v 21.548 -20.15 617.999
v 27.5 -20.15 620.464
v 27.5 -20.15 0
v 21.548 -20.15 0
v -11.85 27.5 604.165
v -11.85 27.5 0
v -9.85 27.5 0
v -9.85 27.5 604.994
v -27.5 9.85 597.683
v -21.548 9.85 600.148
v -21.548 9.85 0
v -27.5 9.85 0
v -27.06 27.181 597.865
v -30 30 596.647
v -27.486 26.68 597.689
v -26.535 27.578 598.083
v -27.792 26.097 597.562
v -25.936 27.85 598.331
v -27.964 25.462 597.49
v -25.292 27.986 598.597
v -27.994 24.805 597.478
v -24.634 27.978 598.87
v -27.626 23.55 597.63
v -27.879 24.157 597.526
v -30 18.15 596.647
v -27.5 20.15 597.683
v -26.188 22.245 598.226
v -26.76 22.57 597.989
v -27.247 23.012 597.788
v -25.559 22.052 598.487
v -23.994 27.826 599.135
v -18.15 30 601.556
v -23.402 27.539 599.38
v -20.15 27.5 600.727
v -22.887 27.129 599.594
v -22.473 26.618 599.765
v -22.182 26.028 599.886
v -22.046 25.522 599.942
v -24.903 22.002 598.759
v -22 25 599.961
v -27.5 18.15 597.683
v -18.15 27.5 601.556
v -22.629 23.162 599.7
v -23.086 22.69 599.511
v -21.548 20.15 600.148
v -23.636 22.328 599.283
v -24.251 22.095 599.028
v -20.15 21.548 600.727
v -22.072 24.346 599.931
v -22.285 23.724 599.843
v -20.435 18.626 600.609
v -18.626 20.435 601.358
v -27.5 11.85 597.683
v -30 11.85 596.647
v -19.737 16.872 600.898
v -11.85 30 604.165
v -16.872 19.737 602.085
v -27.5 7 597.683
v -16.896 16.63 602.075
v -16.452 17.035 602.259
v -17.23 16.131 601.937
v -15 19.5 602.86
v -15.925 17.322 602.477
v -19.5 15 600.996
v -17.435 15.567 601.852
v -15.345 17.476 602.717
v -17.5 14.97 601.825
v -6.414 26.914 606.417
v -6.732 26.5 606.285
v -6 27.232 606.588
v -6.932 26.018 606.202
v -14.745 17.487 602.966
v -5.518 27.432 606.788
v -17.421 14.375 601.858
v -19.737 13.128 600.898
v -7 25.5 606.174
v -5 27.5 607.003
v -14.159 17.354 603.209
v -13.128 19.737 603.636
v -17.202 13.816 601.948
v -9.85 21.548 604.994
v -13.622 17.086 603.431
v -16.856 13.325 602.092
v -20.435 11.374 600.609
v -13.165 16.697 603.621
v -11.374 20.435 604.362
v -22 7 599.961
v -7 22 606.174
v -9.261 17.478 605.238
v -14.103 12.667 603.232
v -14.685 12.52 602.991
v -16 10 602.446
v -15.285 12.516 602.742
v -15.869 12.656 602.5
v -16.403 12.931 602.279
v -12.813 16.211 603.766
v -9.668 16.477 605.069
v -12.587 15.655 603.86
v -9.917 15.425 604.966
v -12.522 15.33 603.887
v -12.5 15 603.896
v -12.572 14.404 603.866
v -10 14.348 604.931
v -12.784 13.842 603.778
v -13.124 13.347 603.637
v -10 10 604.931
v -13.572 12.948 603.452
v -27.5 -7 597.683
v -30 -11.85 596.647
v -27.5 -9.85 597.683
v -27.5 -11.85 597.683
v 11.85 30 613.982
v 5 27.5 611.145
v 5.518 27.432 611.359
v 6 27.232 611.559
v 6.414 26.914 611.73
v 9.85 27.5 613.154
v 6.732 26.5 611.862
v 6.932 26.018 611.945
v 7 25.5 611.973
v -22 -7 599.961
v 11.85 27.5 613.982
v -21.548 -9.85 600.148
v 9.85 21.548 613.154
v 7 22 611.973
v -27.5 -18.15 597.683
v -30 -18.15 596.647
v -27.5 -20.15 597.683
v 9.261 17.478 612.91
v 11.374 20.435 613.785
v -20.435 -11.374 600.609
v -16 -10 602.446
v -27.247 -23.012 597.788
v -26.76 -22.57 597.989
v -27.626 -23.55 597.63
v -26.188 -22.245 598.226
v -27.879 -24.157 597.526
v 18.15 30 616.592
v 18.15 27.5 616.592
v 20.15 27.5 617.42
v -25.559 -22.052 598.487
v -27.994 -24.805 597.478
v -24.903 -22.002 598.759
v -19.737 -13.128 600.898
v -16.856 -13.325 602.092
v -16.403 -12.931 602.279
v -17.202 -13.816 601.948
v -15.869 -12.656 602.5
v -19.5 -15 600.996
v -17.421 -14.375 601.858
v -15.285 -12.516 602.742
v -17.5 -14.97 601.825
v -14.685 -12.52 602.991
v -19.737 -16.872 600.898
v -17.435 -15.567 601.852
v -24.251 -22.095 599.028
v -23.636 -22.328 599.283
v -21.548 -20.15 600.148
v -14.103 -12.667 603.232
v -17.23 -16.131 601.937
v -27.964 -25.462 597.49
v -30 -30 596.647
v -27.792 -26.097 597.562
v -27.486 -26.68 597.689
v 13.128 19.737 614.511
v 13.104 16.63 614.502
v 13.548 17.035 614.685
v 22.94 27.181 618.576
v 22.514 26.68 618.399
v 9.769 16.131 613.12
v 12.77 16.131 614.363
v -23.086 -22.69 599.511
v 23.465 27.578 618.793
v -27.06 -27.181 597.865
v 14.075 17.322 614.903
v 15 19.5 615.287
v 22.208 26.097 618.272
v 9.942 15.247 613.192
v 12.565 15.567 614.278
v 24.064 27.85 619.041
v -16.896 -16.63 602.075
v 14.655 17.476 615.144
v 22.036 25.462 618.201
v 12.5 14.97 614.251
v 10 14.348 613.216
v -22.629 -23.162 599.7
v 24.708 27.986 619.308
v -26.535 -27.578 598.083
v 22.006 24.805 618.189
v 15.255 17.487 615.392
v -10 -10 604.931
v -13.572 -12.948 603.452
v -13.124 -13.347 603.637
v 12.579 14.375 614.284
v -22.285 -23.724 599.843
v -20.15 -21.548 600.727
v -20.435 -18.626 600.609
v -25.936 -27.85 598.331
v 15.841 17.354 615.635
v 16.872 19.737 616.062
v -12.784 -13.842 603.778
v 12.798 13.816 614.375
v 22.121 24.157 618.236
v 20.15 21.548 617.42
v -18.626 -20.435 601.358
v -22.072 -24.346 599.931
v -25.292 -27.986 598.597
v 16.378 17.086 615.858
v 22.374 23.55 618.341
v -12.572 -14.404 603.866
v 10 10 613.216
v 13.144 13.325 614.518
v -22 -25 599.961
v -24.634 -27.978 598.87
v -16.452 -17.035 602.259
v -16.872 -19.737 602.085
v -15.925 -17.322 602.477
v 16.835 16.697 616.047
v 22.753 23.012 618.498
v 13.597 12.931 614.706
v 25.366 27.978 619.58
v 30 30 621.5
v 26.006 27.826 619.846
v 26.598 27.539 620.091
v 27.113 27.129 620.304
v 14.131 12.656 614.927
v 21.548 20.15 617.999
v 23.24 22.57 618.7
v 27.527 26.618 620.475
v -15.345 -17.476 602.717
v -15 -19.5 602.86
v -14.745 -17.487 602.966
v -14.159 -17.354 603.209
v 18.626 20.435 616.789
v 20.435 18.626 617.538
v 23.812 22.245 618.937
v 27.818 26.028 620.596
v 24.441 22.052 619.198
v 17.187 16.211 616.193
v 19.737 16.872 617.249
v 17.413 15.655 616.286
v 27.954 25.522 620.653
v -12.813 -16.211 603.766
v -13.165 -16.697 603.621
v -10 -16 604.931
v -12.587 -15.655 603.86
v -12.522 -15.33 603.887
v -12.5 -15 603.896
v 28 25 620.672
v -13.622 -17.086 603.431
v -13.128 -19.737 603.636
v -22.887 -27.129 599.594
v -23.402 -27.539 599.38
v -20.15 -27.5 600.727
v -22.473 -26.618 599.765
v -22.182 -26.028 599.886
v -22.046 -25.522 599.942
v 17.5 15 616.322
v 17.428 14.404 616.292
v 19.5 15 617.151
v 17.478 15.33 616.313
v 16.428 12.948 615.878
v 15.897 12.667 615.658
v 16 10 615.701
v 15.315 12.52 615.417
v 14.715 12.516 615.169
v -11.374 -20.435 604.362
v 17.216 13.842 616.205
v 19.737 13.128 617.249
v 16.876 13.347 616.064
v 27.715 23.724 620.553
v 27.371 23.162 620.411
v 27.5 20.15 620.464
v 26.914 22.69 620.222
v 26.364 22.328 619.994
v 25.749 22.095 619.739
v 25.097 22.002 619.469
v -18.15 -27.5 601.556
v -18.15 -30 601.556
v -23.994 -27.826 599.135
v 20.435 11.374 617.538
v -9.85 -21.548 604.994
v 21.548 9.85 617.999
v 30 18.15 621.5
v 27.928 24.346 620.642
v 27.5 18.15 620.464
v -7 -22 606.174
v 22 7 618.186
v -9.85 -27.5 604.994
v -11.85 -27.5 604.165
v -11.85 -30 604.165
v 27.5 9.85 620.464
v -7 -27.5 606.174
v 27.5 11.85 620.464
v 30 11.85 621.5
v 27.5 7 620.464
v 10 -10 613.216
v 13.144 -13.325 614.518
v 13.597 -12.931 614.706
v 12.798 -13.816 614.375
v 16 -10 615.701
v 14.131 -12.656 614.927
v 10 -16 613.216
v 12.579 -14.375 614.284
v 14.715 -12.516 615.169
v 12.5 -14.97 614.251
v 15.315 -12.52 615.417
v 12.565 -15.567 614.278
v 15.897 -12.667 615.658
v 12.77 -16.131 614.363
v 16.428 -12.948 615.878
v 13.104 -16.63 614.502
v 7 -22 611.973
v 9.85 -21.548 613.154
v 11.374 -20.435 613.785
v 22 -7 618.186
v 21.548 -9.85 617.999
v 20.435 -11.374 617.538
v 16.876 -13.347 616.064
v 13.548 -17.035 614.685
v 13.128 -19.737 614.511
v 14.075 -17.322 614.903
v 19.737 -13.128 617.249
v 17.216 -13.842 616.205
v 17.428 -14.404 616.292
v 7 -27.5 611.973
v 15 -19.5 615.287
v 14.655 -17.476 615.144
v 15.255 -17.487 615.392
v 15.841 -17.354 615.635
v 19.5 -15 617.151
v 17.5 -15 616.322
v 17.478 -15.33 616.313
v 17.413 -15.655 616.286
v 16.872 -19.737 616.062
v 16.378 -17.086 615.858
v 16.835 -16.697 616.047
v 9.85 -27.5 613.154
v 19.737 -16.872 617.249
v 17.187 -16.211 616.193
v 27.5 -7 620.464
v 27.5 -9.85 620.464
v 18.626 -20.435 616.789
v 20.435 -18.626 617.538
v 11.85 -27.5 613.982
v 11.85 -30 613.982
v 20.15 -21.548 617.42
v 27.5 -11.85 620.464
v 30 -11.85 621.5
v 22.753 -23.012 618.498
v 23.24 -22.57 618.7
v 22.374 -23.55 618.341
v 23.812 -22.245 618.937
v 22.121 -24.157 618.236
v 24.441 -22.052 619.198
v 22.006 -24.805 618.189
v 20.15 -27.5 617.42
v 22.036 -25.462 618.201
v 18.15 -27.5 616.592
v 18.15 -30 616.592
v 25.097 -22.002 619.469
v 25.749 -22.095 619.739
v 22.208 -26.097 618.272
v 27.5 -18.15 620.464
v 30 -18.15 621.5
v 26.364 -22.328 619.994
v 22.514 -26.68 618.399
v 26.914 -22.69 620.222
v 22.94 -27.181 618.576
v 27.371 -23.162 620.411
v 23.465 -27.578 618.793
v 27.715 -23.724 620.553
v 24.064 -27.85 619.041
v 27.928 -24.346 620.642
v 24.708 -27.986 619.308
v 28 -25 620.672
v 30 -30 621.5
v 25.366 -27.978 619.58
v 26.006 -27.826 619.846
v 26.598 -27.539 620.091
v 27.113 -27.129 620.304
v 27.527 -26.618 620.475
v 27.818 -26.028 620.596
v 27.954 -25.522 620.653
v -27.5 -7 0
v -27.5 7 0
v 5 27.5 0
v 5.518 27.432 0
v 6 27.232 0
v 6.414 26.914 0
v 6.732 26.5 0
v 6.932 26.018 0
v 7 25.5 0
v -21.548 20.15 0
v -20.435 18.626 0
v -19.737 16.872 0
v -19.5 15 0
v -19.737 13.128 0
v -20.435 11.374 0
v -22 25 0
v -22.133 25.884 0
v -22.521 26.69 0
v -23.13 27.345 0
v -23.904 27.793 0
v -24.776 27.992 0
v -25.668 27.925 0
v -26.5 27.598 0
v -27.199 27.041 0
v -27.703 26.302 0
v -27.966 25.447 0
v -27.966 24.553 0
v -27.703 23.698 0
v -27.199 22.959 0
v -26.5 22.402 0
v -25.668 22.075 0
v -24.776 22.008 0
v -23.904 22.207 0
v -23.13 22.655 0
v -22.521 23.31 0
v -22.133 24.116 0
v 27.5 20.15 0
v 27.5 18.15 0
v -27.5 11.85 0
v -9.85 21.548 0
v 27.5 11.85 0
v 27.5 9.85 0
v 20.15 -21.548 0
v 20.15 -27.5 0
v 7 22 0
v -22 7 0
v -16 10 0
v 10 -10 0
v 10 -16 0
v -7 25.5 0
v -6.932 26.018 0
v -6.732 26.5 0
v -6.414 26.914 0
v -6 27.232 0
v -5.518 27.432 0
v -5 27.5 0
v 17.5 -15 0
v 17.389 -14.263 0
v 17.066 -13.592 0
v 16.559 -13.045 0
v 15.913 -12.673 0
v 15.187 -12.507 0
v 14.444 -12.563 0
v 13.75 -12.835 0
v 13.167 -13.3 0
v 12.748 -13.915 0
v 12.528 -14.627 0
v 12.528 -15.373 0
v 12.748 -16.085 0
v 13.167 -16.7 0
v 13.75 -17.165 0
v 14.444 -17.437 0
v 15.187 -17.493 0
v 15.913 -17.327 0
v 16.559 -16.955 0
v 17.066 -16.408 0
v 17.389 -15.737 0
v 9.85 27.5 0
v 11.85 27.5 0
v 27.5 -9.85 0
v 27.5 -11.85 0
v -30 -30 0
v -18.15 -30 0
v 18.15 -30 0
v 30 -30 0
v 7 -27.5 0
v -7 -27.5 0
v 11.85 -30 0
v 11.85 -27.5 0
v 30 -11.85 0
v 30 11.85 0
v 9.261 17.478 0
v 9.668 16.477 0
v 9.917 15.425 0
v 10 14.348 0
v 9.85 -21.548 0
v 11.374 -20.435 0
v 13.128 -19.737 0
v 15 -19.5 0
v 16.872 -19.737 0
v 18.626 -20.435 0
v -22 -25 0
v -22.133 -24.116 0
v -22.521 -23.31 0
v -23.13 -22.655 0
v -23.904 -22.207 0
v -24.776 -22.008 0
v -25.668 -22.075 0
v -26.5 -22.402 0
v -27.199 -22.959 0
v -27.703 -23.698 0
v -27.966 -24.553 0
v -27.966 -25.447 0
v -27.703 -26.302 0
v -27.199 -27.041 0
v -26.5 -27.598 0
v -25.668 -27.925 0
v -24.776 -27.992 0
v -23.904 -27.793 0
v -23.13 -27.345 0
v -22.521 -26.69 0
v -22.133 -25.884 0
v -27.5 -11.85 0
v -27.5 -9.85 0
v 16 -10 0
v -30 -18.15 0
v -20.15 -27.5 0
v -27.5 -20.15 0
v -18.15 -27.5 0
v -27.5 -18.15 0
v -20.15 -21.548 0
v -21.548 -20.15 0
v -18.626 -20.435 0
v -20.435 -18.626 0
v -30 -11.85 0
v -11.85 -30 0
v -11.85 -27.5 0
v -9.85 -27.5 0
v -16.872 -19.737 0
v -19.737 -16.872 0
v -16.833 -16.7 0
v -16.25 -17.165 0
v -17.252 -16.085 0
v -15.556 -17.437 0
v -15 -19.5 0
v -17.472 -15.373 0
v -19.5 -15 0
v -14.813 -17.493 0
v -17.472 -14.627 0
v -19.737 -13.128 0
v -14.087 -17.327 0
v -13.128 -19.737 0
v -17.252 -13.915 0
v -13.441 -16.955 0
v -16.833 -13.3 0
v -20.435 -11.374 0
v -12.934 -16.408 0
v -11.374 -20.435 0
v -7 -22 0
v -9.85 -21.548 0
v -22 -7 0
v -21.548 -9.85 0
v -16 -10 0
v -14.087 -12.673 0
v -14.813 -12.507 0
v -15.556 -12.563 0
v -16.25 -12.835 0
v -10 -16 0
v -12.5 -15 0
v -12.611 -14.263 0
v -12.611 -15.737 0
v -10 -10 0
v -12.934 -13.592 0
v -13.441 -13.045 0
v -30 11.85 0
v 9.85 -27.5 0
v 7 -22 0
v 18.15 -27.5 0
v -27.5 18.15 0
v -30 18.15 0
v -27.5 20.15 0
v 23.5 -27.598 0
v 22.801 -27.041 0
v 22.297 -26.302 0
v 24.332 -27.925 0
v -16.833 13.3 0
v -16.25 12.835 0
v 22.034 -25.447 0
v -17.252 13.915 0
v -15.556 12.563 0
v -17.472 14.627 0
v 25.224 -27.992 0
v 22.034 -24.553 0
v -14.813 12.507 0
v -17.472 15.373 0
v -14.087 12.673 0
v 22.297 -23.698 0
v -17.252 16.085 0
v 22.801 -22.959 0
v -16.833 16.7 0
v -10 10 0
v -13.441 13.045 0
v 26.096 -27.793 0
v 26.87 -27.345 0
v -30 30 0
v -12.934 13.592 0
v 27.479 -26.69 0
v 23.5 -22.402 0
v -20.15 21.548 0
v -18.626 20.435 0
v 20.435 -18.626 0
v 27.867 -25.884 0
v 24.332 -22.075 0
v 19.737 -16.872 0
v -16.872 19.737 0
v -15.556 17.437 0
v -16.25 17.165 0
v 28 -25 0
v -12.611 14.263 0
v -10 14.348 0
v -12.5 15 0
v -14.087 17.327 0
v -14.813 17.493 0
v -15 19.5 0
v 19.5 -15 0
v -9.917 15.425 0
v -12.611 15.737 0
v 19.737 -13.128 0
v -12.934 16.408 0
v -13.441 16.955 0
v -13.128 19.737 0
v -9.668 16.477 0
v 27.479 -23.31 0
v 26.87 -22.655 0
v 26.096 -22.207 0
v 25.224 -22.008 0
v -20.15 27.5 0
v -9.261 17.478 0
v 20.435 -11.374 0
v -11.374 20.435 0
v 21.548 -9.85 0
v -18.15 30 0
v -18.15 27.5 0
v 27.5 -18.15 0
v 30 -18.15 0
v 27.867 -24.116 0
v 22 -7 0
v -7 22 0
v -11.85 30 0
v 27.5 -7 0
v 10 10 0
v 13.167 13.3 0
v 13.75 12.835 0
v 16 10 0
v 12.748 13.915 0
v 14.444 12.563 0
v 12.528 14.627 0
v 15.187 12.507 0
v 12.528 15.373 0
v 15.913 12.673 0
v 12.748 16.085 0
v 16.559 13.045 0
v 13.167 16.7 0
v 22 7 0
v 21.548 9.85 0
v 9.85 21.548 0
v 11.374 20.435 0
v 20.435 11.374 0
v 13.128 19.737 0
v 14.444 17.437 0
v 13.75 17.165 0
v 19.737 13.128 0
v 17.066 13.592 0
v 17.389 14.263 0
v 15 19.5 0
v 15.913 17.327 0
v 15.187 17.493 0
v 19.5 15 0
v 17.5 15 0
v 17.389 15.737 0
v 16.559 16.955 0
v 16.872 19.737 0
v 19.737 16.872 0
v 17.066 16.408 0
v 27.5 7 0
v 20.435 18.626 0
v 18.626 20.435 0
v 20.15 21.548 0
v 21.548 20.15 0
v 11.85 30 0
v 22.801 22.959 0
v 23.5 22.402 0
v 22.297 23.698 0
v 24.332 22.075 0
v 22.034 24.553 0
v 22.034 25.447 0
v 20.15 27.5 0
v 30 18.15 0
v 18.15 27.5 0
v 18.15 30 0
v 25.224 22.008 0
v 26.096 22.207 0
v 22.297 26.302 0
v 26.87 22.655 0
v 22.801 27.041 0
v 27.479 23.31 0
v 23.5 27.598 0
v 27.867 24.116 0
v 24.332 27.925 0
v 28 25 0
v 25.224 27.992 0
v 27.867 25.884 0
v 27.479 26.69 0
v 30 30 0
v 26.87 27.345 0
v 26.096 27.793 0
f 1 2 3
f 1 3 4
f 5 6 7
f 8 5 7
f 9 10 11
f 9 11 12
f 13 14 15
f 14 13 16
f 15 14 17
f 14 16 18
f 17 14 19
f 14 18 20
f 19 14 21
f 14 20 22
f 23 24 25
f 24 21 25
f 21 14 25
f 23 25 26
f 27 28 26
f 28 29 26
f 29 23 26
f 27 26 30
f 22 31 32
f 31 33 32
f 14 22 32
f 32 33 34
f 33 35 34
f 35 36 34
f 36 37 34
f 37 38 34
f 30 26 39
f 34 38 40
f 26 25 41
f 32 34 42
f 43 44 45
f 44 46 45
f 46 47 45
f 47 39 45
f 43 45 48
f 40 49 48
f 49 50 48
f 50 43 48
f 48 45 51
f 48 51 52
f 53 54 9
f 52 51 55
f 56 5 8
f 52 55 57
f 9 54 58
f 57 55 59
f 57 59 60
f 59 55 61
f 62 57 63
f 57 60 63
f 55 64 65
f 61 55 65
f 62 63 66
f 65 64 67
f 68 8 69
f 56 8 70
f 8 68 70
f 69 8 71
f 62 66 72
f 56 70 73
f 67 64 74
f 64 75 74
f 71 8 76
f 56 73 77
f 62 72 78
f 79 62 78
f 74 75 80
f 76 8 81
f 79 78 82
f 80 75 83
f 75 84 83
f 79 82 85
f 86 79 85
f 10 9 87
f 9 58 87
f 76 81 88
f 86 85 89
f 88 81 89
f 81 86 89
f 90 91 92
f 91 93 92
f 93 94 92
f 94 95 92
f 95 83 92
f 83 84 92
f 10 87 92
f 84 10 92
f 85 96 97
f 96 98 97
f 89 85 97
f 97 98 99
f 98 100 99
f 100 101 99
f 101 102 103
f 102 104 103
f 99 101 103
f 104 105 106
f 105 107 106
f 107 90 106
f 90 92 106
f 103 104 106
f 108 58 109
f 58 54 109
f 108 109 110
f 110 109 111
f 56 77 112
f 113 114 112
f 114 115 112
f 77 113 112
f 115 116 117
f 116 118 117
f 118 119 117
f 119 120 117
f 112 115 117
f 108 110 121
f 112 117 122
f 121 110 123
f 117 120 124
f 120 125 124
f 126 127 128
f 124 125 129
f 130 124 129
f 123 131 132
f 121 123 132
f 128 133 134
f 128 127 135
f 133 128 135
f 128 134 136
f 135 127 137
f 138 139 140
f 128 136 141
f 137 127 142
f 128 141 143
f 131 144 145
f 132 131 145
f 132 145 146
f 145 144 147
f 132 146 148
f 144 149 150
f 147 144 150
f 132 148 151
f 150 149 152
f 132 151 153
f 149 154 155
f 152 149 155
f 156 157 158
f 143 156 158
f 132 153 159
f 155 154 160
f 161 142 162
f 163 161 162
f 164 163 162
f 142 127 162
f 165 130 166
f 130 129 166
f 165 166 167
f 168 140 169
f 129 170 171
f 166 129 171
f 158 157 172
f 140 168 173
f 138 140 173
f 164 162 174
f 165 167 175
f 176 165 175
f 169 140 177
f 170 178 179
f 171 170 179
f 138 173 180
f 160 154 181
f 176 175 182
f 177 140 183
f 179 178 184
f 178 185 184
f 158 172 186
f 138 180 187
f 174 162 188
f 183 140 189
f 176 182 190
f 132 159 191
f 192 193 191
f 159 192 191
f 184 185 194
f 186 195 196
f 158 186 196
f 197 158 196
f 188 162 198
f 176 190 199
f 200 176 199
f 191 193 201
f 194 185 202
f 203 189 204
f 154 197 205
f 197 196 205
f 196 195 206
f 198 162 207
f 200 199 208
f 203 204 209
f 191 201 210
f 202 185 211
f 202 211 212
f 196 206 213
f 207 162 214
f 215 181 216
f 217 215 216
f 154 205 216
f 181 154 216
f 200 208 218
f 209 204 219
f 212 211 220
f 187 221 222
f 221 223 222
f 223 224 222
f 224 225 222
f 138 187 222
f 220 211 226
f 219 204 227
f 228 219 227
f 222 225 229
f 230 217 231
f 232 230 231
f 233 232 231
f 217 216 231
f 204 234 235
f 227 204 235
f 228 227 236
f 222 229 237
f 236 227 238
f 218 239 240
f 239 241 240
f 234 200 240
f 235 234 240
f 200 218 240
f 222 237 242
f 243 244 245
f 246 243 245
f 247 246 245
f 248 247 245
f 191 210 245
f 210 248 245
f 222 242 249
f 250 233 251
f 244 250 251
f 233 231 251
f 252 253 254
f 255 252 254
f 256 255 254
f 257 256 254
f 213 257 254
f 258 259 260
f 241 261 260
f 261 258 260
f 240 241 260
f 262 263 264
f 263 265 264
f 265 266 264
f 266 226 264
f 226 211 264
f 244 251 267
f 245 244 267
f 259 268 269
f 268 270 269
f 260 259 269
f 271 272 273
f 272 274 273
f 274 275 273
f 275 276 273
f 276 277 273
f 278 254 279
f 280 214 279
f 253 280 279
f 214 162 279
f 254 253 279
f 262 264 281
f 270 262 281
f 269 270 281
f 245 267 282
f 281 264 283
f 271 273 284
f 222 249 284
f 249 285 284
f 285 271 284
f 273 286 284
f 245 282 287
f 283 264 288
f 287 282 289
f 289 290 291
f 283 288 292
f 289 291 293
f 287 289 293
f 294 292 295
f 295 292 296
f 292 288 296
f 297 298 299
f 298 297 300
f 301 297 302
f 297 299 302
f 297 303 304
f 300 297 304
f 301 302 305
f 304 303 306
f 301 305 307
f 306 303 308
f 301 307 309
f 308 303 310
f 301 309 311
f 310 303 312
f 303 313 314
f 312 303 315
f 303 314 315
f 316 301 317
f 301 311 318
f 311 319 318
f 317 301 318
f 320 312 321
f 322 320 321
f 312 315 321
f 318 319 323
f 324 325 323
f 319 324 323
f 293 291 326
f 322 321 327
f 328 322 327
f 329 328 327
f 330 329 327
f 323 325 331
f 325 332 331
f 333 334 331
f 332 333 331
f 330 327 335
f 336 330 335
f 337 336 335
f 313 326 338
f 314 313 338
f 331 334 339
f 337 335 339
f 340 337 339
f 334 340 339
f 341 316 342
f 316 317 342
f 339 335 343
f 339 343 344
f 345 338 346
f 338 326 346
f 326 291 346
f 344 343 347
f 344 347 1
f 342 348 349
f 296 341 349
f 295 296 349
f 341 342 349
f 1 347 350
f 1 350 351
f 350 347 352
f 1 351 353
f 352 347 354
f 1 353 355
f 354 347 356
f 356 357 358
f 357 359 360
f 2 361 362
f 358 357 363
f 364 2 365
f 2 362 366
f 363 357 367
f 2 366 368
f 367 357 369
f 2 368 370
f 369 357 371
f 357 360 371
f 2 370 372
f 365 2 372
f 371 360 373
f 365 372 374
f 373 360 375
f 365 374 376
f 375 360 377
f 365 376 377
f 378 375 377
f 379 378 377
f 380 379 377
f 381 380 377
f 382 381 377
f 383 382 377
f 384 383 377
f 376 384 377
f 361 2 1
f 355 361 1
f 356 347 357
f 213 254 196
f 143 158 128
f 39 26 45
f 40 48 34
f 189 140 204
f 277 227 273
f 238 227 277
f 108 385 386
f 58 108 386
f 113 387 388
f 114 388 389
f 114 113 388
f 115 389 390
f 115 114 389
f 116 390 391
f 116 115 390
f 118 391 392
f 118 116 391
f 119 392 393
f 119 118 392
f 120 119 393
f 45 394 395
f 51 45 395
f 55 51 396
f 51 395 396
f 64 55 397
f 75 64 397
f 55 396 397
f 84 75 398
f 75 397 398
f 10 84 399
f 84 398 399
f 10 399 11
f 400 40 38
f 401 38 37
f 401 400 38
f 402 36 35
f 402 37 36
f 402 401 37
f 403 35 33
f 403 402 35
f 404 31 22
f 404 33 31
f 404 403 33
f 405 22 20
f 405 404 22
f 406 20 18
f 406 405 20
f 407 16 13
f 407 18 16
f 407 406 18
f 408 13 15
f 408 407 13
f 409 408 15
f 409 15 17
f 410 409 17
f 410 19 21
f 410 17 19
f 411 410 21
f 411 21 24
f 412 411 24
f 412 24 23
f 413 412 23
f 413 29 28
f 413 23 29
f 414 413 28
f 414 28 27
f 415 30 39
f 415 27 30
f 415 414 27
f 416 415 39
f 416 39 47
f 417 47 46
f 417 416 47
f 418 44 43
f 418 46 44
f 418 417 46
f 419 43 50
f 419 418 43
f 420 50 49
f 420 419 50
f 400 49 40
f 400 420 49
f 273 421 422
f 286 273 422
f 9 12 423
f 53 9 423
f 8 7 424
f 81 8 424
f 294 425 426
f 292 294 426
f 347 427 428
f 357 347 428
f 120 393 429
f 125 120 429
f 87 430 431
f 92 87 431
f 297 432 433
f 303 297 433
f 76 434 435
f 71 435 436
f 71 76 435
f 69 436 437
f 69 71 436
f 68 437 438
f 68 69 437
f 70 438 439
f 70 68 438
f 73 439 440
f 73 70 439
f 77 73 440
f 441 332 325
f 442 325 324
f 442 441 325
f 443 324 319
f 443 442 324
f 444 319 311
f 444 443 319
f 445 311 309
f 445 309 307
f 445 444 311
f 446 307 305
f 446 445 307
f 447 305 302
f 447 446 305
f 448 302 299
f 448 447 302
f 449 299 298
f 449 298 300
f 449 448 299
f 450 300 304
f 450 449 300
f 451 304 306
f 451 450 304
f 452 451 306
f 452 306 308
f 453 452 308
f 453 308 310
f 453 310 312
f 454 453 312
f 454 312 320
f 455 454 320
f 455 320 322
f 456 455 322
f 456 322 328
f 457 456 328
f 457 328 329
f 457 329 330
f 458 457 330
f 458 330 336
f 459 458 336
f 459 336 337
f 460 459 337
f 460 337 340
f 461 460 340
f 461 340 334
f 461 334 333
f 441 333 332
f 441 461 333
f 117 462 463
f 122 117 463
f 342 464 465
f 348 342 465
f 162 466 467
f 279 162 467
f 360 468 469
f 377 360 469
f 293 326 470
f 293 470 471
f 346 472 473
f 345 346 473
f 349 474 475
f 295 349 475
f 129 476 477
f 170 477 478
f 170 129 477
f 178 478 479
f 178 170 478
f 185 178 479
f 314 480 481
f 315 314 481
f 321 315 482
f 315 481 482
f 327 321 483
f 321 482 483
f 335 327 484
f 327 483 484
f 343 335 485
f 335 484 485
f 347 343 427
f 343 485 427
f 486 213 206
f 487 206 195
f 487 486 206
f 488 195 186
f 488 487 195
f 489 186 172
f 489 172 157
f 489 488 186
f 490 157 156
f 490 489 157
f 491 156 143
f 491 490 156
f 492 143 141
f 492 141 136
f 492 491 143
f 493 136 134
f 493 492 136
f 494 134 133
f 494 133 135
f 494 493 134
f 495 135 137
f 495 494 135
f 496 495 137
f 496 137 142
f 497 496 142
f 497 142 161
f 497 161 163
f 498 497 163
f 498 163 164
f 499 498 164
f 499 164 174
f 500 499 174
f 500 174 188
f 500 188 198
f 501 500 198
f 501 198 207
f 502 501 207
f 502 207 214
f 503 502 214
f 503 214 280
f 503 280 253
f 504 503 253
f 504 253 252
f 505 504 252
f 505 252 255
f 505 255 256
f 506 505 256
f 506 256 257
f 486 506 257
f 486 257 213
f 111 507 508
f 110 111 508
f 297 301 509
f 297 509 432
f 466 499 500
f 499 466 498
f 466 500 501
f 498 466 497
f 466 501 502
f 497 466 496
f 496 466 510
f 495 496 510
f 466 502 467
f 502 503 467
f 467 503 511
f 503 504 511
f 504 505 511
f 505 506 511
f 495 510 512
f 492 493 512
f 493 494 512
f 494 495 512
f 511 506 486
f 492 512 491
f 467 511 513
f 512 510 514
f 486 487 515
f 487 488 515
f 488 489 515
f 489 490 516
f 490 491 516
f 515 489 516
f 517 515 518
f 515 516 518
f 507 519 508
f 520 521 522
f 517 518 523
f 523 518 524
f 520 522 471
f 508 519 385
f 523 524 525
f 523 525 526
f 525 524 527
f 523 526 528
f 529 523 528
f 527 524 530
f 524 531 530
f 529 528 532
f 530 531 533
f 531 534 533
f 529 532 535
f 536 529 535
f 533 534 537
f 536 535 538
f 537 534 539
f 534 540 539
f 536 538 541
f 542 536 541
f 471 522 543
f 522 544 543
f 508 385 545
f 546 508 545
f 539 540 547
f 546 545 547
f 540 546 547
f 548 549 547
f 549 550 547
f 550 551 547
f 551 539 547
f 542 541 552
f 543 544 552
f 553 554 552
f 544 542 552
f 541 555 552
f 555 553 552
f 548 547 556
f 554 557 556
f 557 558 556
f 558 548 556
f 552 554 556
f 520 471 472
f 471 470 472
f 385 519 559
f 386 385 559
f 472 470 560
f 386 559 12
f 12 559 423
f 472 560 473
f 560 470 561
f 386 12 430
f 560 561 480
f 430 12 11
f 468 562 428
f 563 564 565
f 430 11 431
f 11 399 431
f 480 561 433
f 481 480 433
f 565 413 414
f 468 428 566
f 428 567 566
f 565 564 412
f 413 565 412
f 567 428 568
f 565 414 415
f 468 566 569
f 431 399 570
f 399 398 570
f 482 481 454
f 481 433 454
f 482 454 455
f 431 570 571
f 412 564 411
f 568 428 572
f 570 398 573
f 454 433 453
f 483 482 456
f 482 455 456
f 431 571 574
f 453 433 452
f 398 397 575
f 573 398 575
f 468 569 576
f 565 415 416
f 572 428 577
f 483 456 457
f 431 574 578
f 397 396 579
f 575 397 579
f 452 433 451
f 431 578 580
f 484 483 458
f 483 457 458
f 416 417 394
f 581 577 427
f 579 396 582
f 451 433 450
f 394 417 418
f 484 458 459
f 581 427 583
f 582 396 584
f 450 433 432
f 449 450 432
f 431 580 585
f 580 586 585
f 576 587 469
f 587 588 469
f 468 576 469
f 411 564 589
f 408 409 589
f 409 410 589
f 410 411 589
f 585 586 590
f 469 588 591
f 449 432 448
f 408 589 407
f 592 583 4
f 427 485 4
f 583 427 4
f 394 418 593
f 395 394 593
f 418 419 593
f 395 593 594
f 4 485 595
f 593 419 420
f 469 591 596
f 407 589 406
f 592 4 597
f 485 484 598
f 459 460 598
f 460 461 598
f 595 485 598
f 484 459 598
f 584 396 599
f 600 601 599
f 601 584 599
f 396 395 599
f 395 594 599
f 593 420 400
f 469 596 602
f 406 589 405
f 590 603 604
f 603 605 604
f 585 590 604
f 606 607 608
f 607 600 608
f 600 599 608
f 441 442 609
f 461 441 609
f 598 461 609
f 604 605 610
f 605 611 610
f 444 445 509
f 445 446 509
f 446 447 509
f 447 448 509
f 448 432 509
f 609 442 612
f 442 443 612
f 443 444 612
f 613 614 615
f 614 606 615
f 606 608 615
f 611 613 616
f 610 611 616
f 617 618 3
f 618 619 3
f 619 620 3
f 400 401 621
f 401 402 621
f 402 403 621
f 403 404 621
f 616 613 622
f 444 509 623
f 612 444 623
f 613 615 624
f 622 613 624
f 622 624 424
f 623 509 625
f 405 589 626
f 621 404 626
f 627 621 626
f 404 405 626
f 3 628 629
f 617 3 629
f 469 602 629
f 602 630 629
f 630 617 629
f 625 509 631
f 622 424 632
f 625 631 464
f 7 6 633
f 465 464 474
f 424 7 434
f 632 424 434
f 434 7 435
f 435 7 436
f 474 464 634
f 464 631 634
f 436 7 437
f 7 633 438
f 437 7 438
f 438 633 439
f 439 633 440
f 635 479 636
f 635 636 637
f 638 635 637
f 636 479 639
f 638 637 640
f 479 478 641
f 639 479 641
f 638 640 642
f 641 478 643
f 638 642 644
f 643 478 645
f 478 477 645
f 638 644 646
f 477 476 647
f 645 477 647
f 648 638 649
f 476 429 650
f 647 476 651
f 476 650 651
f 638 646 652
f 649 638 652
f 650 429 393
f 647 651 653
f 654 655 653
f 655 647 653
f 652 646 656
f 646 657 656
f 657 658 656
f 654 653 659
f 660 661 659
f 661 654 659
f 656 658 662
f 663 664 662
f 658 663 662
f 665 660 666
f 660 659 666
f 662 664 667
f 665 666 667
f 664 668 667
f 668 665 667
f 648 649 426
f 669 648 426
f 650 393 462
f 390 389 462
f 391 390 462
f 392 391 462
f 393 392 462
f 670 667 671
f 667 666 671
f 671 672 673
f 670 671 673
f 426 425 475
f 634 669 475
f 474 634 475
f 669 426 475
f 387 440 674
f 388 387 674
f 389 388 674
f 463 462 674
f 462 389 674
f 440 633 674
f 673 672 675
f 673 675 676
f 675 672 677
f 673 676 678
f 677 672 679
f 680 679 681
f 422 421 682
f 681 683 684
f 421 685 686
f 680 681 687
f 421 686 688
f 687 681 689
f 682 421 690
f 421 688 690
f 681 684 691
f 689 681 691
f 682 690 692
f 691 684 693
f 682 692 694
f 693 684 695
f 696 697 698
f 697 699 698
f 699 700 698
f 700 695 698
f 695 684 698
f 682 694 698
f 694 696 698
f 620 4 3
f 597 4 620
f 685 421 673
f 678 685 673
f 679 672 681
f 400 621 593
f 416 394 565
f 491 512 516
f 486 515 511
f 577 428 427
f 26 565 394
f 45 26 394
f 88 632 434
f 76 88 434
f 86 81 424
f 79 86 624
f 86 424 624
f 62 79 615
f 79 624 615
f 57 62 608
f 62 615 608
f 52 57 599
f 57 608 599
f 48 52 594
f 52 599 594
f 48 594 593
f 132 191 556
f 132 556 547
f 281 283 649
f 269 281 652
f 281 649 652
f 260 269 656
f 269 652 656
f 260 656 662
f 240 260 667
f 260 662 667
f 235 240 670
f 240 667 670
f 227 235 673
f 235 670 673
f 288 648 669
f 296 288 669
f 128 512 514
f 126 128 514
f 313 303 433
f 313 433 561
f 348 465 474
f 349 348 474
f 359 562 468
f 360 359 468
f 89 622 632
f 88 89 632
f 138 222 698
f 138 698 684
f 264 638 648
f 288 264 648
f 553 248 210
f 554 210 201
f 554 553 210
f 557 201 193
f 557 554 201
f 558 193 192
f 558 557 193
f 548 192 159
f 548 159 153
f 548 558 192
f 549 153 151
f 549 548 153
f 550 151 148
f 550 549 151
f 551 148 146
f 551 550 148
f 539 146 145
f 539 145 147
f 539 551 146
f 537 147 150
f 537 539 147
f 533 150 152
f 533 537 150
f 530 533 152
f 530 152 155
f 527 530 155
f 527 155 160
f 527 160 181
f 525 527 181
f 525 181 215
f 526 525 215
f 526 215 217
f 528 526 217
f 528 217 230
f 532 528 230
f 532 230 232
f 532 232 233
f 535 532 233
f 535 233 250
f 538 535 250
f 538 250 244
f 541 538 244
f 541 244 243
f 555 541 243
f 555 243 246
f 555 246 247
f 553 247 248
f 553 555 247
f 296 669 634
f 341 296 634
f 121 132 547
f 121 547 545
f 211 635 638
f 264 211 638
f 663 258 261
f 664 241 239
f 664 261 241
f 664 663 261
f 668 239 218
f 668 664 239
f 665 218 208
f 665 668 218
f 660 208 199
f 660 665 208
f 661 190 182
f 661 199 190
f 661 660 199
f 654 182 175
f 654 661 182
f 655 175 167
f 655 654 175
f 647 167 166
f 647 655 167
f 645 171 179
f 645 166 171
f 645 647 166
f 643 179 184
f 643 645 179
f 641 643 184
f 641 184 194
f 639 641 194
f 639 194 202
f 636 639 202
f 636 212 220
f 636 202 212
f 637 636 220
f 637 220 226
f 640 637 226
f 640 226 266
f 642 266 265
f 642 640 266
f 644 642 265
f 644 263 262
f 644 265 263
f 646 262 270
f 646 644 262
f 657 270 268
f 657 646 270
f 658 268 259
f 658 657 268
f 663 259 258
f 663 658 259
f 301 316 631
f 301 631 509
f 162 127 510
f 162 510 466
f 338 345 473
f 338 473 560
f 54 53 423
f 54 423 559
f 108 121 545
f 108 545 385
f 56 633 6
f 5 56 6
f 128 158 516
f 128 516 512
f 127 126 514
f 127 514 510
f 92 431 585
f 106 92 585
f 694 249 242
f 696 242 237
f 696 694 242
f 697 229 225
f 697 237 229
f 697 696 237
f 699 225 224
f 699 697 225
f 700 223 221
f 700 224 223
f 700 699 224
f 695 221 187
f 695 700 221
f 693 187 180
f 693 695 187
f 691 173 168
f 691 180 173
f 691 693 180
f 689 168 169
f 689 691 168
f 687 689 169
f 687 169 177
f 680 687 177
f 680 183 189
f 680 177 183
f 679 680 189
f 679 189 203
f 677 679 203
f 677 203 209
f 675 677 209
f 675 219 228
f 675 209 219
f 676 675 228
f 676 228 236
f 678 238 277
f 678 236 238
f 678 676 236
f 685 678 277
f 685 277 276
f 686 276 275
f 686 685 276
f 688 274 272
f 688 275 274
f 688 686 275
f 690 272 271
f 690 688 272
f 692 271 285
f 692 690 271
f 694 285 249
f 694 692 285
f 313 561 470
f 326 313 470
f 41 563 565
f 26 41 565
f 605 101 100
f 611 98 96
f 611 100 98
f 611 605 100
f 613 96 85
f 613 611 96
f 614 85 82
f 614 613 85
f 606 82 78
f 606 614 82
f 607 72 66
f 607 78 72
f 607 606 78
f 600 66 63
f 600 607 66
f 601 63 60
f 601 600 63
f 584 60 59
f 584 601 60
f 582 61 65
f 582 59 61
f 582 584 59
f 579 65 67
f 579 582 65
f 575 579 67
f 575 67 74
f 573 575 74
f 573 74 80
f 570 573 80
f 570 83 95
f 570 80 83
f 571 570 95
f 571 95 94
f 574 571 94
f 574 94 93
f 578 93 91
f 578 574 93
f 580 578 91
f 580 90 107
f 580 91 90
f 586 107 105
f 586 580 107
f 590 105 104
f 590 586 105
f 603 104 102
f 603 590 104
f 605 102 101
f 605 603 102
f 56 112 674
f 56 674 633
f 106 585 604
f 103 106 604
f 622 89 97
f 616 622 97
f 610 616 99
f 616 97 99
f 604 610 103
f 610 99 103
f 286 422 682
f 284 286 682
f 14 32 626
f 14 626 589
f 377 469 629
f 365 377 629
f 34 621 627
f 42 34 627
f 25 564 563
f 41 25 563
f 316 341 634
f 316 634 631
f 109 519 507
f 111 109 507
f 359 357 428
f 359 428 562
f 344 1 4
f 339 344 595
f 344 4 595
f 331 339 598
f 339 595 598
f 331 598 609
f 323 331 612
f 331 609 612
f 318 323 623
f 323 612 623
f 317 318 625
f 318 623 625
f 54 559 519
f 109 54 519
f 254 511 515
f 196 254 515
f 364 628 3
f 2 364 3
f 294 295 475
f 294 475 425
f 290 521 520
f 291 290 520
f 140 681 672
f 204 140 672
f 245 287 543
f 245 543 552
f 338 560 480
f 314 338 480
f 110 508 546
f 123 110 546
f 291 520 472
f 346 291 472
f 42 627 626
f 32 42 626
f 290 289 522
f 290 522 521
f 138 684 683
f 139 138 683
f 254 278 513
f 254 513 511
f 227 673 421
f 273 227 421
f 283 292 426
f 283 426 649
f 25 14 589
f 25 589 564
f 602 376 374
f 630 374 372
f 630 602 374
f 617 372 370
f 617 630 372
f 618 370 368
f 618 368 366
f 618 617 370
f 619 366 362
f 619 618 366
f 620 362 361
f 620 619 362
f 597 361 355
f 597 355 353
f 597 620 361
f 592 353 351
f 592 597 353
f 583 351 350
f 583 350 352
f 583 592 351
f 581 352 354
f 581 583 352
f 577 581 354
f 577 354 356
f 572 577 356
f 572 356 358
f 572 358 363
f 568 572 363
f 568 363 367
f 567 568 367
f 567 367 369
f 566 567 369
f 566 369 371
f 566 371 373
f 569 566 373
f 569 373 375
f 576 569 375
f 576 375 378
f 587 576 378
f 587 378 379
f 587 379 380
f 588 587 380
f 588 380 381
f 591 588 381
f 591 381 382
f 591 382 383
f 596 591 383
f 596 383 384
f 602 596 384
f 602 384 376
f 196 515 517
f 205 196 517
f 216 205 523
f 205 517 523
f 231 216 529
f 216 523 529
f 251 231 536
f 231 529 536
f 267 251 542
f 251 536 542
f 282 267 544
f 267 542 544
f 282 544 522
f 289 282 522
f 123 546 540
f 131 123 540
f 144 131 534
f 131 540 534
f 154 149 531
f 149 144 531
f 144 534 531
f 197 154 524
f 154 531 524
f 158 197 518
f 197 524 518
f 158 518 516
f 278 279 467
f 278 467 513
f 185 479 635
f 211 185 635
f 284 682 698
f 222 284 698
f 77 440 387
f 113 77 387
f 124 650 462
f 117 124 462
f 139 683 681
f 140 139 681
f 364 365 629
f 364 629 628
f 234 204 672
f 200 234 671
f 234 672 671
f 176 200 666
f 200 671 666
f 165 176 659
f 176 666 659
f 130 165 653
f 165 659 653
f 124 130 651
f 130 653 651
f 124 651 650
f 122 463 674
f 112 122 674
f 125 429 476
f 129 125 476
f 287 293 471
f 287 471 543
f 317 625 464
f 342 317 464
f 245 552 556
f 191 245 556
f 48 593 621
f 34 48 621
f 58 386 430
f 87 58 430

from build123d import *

# Parameters (mm, degrees)
F0_R          = 3
F0_R_2        = 2.5
F1_DEPTH      = 621.5
F2_R          = 2
F3_R          = 7
F6_DEPTH      = 30
F6_DEPTH_BACK = 30


# Not quite as in the source:
# - a feature names something its author has since deleted; it is built from what else it names


with BuildPart() as f1:
    # F0 (on Top) → F1 (new body)
    with BuildSketch(Plane.XY):
        with BuildLine():
            Line((18.15, -30), (30, -30))
            Line((30, -30), (30, -18.15))
            Line((30, -18.15), (27.5, -18.15))
            Line((27.5, -18.15), (27.5, -20.15))
            Line((27.5, -20.15), (21.5477069044, -20.15))
            ThreePointArc((21.5477069044, -20.15), (19.5, -15), (21.5477069044, -9.85))
            Line((21.5477069044, -9.85), (27.5, -9.85))
            Line((27.5, -9.85), (27.5, -11.85))
            Line((27.5, -11.85), (30, -11.85))
            Line((30, -11.85), (30, 11.85))
            Line((30, 11.85), (27.5, 11.85))
            Line((27.5, 11.85), (27.5, 9.85))
            Line((27.5, 9.85), (21.5477069044, 9.85))
            ThreePointArc((21.5477069044, 9.85), (19.5, 15), (21.5477069044, 20.15))
            Line((21.5477069044, 20.15), (27.5, 20.15))
            Line((27.5, 20.15), (27.5, 18.15))
            Line((27.5, 18.15), (30, 18.15))
            Line((30, 18.15), (30, 30))
            Line((30, 30), (18.15, 30))
            Line((18.15, 30), (18.15, 27.5))
            Line((18.15, 27.5), (20.15, 27.5))
            Line((20.15, 27.5), (20.15, 21.5477069044))
            ThreePointArc((20.15, 21.5477069044), (15, 19.5), (9.85, 21.5477069044))
            Line((9.85, 21.5477069044), (9.85, 27.5))
            Line((9.85, 27.5), (11.85, 27.5))
            Line((11.85, 27.5), (11.85, 30))
            Line((11.85, 30), (-11.85, 30))
            Line((-11.85, 30), (-11.85, 27.5))
            Line((-11.85, 27.5), (-9.85, 27.5))
            Line((-9.85, 27.5), (-9.85, 21.5477069044))
            ThreePointArc((-9.85, 21.5477069044), (-15, 19.5), (-20.15, 21.5477069044))
            Line((-20.15, 21.5477069044), (-20.15, 27.5))
            Line((-20.15, 27.5), (-18.15, 27.5))
            Line((-18.15, 27.5), (-18.15, 30))
            Line((-18.15, 30), (-30, 30))
            Line((-30, 30), (-30, 18.15))
            Line((-30, 18.15), (-27.5, 18.15))
            Line((-27.5, 18.15), (-27.5, 20.15))
            Line((-27.5, 20.15), (-21.5477069044, 20.15))
            ThreePointArc((-21.5477069044, 20.15), (-19.5, 15), (-21.5477069044, 9.85))
            Line((-21.5477069044, 9.85), (-27.5, 9.85))
            Line((-27.5, 9.85), (-27.5, 11.85))
            Line((-27.5, 11.85), (-30, 11.85))
            Line((-30, 11.85), (-30, -11.85))
            Line((-30, -11.85), (-27.5, -11.85))
            Line((-27.5, -11.85), (-27.5, -9.85))
            Line((-27.5, -9.85), (-21.5477069044, -9.85))
            ThreePointArc((-21.5477069044, -9.85), (-19.5, -15), (-21.5477069044, -20.15))
            Line((-21.5477069044, -20.15), (-27.5, -20.15))
            Line((-27.5, -20.15), (-27.5, -18.15))
            Line((-27.5, -18.15), (-30, -18.15))
            Line((-30, -18.15), (-30, -30))
            Line((-30, -30), (-18.15, -30))
            Line((-18.15, -30), (-18.15, -27.5))
            Line((-18.15, -27.5), (-20.15, -27.5))
            Line((-20.15, -27.5), (-20.15, -21.5477069044))
            ThreePointArc((-20.15, -21.5477069044), (-15, -19.5), (-9.85, -21.5477069044))
            Line((-9.85, -21.5477069044), (-9.85, -27.5))
            Line((-9.85, -27.5), (-11.85, -27.5))
            Line((-11.85, -27.5), (-11.85, -30))
            Line((-11.85, -30), (11.85, -30))
            Line((11.85, -30), (11.85, -27.5))
            Line((11.85, -27.5), (9.85, -27.5))
            Line((9.85, -27.5), (9.85, -21.5477069044))
            ThreePointArc((9.85, -21.5477069044), (15, -19.5), (20.15, -21.5477069044))
            Line((20.15, -21.5477069044), (20.15, -27.5))
            Line((20.15, -27.5), (18.15, -27.5))
            Line((18.15, -27.5), (18.15, -30))
        make_face()
        with Locations((-25, -25)):
            Circle(F0_R, mode=Mode.SUBTRACT)
        with Locations((-15, -15)):
            Circle(F0_R_2, mode=Mode.SUBTRACT)
        with Locations((25, -25)):
            Circle(F0_R, mode=Mode.SUBTRACT)
        with Locations((15, -15)):
            Circle(F0_R_2, mode=Mode.SUBTRACT)
        with Locations((-25, 25)):
            Circle(F0_R, mode=Mode.SUBTRACT)
        with Locations((-15, 15)):
            Circle(F0_R_2, mode=Mode.SUBTRACT)
        Polygon((-7, 22), (-7, 27.5), (0, 27.5), (7, 27.5), (7, 22), (10, 16), (10, 10), (16, 10), (22, 7), (27.5, 7), (27.5, 0), (27.5, -7), (22, -7), (16, -10), (10, -10), (10, -16), (7, -22), (7, -27.5), (0, -27.5), (-7, -27.5), (-7, -22), (-10, -16), (-10, -10), (-16, -10), (-22, -7), (-27.5, -7), (-27.5, 0), (-27.5, 7), (-22, 7), (-16, 10), (-10, 10), (-10, 16), align=None, mode=Mode.SUBTRACT)
        with Locations((15, 15)):
            Circle(F0_R_2, mode=Mode.SUBTRACT)
        with Locations((25, 25)):
            Circle(F0_R, mode=Mode.SUBTRACT)
    extrude(amount=F1_DEPTH)

    # F2
    f2_edges = [f1.edges().sort_by_distance(p)[0] for p in [
        (-7, 27.5, 310.75),
        (7, 27.5, 310.75),
    ]]
    fillet(f2_edges, radius=F2_R)

    # F3
    f3_edges = [f1.edges().sort_by_distance(p)[0] for p in [
        (-10, 16, 310.75),
        (10, 16, 310.75),
    ]]
    fillet(f3_edges, radius=F3_R)

    # F5 (on Front) → F6 (cut, two sides)
    with BuildSketch(Plane.XZ) as f6_sk:
        Polygon((30, 621.5), (-11.184961555, 720.929292752), (-183.3312368923, 649.6239707953), (-142.1462753372, 550.1946780433), align=None)
    extrude(amount=F6_DEPTH, mode=Mode.SUBTRACT)
    extrude(f6_sk.sketch, amount=-F6_DEPTH_BACK, mode=Mode.SUBTRACT)


solid = f1.part
